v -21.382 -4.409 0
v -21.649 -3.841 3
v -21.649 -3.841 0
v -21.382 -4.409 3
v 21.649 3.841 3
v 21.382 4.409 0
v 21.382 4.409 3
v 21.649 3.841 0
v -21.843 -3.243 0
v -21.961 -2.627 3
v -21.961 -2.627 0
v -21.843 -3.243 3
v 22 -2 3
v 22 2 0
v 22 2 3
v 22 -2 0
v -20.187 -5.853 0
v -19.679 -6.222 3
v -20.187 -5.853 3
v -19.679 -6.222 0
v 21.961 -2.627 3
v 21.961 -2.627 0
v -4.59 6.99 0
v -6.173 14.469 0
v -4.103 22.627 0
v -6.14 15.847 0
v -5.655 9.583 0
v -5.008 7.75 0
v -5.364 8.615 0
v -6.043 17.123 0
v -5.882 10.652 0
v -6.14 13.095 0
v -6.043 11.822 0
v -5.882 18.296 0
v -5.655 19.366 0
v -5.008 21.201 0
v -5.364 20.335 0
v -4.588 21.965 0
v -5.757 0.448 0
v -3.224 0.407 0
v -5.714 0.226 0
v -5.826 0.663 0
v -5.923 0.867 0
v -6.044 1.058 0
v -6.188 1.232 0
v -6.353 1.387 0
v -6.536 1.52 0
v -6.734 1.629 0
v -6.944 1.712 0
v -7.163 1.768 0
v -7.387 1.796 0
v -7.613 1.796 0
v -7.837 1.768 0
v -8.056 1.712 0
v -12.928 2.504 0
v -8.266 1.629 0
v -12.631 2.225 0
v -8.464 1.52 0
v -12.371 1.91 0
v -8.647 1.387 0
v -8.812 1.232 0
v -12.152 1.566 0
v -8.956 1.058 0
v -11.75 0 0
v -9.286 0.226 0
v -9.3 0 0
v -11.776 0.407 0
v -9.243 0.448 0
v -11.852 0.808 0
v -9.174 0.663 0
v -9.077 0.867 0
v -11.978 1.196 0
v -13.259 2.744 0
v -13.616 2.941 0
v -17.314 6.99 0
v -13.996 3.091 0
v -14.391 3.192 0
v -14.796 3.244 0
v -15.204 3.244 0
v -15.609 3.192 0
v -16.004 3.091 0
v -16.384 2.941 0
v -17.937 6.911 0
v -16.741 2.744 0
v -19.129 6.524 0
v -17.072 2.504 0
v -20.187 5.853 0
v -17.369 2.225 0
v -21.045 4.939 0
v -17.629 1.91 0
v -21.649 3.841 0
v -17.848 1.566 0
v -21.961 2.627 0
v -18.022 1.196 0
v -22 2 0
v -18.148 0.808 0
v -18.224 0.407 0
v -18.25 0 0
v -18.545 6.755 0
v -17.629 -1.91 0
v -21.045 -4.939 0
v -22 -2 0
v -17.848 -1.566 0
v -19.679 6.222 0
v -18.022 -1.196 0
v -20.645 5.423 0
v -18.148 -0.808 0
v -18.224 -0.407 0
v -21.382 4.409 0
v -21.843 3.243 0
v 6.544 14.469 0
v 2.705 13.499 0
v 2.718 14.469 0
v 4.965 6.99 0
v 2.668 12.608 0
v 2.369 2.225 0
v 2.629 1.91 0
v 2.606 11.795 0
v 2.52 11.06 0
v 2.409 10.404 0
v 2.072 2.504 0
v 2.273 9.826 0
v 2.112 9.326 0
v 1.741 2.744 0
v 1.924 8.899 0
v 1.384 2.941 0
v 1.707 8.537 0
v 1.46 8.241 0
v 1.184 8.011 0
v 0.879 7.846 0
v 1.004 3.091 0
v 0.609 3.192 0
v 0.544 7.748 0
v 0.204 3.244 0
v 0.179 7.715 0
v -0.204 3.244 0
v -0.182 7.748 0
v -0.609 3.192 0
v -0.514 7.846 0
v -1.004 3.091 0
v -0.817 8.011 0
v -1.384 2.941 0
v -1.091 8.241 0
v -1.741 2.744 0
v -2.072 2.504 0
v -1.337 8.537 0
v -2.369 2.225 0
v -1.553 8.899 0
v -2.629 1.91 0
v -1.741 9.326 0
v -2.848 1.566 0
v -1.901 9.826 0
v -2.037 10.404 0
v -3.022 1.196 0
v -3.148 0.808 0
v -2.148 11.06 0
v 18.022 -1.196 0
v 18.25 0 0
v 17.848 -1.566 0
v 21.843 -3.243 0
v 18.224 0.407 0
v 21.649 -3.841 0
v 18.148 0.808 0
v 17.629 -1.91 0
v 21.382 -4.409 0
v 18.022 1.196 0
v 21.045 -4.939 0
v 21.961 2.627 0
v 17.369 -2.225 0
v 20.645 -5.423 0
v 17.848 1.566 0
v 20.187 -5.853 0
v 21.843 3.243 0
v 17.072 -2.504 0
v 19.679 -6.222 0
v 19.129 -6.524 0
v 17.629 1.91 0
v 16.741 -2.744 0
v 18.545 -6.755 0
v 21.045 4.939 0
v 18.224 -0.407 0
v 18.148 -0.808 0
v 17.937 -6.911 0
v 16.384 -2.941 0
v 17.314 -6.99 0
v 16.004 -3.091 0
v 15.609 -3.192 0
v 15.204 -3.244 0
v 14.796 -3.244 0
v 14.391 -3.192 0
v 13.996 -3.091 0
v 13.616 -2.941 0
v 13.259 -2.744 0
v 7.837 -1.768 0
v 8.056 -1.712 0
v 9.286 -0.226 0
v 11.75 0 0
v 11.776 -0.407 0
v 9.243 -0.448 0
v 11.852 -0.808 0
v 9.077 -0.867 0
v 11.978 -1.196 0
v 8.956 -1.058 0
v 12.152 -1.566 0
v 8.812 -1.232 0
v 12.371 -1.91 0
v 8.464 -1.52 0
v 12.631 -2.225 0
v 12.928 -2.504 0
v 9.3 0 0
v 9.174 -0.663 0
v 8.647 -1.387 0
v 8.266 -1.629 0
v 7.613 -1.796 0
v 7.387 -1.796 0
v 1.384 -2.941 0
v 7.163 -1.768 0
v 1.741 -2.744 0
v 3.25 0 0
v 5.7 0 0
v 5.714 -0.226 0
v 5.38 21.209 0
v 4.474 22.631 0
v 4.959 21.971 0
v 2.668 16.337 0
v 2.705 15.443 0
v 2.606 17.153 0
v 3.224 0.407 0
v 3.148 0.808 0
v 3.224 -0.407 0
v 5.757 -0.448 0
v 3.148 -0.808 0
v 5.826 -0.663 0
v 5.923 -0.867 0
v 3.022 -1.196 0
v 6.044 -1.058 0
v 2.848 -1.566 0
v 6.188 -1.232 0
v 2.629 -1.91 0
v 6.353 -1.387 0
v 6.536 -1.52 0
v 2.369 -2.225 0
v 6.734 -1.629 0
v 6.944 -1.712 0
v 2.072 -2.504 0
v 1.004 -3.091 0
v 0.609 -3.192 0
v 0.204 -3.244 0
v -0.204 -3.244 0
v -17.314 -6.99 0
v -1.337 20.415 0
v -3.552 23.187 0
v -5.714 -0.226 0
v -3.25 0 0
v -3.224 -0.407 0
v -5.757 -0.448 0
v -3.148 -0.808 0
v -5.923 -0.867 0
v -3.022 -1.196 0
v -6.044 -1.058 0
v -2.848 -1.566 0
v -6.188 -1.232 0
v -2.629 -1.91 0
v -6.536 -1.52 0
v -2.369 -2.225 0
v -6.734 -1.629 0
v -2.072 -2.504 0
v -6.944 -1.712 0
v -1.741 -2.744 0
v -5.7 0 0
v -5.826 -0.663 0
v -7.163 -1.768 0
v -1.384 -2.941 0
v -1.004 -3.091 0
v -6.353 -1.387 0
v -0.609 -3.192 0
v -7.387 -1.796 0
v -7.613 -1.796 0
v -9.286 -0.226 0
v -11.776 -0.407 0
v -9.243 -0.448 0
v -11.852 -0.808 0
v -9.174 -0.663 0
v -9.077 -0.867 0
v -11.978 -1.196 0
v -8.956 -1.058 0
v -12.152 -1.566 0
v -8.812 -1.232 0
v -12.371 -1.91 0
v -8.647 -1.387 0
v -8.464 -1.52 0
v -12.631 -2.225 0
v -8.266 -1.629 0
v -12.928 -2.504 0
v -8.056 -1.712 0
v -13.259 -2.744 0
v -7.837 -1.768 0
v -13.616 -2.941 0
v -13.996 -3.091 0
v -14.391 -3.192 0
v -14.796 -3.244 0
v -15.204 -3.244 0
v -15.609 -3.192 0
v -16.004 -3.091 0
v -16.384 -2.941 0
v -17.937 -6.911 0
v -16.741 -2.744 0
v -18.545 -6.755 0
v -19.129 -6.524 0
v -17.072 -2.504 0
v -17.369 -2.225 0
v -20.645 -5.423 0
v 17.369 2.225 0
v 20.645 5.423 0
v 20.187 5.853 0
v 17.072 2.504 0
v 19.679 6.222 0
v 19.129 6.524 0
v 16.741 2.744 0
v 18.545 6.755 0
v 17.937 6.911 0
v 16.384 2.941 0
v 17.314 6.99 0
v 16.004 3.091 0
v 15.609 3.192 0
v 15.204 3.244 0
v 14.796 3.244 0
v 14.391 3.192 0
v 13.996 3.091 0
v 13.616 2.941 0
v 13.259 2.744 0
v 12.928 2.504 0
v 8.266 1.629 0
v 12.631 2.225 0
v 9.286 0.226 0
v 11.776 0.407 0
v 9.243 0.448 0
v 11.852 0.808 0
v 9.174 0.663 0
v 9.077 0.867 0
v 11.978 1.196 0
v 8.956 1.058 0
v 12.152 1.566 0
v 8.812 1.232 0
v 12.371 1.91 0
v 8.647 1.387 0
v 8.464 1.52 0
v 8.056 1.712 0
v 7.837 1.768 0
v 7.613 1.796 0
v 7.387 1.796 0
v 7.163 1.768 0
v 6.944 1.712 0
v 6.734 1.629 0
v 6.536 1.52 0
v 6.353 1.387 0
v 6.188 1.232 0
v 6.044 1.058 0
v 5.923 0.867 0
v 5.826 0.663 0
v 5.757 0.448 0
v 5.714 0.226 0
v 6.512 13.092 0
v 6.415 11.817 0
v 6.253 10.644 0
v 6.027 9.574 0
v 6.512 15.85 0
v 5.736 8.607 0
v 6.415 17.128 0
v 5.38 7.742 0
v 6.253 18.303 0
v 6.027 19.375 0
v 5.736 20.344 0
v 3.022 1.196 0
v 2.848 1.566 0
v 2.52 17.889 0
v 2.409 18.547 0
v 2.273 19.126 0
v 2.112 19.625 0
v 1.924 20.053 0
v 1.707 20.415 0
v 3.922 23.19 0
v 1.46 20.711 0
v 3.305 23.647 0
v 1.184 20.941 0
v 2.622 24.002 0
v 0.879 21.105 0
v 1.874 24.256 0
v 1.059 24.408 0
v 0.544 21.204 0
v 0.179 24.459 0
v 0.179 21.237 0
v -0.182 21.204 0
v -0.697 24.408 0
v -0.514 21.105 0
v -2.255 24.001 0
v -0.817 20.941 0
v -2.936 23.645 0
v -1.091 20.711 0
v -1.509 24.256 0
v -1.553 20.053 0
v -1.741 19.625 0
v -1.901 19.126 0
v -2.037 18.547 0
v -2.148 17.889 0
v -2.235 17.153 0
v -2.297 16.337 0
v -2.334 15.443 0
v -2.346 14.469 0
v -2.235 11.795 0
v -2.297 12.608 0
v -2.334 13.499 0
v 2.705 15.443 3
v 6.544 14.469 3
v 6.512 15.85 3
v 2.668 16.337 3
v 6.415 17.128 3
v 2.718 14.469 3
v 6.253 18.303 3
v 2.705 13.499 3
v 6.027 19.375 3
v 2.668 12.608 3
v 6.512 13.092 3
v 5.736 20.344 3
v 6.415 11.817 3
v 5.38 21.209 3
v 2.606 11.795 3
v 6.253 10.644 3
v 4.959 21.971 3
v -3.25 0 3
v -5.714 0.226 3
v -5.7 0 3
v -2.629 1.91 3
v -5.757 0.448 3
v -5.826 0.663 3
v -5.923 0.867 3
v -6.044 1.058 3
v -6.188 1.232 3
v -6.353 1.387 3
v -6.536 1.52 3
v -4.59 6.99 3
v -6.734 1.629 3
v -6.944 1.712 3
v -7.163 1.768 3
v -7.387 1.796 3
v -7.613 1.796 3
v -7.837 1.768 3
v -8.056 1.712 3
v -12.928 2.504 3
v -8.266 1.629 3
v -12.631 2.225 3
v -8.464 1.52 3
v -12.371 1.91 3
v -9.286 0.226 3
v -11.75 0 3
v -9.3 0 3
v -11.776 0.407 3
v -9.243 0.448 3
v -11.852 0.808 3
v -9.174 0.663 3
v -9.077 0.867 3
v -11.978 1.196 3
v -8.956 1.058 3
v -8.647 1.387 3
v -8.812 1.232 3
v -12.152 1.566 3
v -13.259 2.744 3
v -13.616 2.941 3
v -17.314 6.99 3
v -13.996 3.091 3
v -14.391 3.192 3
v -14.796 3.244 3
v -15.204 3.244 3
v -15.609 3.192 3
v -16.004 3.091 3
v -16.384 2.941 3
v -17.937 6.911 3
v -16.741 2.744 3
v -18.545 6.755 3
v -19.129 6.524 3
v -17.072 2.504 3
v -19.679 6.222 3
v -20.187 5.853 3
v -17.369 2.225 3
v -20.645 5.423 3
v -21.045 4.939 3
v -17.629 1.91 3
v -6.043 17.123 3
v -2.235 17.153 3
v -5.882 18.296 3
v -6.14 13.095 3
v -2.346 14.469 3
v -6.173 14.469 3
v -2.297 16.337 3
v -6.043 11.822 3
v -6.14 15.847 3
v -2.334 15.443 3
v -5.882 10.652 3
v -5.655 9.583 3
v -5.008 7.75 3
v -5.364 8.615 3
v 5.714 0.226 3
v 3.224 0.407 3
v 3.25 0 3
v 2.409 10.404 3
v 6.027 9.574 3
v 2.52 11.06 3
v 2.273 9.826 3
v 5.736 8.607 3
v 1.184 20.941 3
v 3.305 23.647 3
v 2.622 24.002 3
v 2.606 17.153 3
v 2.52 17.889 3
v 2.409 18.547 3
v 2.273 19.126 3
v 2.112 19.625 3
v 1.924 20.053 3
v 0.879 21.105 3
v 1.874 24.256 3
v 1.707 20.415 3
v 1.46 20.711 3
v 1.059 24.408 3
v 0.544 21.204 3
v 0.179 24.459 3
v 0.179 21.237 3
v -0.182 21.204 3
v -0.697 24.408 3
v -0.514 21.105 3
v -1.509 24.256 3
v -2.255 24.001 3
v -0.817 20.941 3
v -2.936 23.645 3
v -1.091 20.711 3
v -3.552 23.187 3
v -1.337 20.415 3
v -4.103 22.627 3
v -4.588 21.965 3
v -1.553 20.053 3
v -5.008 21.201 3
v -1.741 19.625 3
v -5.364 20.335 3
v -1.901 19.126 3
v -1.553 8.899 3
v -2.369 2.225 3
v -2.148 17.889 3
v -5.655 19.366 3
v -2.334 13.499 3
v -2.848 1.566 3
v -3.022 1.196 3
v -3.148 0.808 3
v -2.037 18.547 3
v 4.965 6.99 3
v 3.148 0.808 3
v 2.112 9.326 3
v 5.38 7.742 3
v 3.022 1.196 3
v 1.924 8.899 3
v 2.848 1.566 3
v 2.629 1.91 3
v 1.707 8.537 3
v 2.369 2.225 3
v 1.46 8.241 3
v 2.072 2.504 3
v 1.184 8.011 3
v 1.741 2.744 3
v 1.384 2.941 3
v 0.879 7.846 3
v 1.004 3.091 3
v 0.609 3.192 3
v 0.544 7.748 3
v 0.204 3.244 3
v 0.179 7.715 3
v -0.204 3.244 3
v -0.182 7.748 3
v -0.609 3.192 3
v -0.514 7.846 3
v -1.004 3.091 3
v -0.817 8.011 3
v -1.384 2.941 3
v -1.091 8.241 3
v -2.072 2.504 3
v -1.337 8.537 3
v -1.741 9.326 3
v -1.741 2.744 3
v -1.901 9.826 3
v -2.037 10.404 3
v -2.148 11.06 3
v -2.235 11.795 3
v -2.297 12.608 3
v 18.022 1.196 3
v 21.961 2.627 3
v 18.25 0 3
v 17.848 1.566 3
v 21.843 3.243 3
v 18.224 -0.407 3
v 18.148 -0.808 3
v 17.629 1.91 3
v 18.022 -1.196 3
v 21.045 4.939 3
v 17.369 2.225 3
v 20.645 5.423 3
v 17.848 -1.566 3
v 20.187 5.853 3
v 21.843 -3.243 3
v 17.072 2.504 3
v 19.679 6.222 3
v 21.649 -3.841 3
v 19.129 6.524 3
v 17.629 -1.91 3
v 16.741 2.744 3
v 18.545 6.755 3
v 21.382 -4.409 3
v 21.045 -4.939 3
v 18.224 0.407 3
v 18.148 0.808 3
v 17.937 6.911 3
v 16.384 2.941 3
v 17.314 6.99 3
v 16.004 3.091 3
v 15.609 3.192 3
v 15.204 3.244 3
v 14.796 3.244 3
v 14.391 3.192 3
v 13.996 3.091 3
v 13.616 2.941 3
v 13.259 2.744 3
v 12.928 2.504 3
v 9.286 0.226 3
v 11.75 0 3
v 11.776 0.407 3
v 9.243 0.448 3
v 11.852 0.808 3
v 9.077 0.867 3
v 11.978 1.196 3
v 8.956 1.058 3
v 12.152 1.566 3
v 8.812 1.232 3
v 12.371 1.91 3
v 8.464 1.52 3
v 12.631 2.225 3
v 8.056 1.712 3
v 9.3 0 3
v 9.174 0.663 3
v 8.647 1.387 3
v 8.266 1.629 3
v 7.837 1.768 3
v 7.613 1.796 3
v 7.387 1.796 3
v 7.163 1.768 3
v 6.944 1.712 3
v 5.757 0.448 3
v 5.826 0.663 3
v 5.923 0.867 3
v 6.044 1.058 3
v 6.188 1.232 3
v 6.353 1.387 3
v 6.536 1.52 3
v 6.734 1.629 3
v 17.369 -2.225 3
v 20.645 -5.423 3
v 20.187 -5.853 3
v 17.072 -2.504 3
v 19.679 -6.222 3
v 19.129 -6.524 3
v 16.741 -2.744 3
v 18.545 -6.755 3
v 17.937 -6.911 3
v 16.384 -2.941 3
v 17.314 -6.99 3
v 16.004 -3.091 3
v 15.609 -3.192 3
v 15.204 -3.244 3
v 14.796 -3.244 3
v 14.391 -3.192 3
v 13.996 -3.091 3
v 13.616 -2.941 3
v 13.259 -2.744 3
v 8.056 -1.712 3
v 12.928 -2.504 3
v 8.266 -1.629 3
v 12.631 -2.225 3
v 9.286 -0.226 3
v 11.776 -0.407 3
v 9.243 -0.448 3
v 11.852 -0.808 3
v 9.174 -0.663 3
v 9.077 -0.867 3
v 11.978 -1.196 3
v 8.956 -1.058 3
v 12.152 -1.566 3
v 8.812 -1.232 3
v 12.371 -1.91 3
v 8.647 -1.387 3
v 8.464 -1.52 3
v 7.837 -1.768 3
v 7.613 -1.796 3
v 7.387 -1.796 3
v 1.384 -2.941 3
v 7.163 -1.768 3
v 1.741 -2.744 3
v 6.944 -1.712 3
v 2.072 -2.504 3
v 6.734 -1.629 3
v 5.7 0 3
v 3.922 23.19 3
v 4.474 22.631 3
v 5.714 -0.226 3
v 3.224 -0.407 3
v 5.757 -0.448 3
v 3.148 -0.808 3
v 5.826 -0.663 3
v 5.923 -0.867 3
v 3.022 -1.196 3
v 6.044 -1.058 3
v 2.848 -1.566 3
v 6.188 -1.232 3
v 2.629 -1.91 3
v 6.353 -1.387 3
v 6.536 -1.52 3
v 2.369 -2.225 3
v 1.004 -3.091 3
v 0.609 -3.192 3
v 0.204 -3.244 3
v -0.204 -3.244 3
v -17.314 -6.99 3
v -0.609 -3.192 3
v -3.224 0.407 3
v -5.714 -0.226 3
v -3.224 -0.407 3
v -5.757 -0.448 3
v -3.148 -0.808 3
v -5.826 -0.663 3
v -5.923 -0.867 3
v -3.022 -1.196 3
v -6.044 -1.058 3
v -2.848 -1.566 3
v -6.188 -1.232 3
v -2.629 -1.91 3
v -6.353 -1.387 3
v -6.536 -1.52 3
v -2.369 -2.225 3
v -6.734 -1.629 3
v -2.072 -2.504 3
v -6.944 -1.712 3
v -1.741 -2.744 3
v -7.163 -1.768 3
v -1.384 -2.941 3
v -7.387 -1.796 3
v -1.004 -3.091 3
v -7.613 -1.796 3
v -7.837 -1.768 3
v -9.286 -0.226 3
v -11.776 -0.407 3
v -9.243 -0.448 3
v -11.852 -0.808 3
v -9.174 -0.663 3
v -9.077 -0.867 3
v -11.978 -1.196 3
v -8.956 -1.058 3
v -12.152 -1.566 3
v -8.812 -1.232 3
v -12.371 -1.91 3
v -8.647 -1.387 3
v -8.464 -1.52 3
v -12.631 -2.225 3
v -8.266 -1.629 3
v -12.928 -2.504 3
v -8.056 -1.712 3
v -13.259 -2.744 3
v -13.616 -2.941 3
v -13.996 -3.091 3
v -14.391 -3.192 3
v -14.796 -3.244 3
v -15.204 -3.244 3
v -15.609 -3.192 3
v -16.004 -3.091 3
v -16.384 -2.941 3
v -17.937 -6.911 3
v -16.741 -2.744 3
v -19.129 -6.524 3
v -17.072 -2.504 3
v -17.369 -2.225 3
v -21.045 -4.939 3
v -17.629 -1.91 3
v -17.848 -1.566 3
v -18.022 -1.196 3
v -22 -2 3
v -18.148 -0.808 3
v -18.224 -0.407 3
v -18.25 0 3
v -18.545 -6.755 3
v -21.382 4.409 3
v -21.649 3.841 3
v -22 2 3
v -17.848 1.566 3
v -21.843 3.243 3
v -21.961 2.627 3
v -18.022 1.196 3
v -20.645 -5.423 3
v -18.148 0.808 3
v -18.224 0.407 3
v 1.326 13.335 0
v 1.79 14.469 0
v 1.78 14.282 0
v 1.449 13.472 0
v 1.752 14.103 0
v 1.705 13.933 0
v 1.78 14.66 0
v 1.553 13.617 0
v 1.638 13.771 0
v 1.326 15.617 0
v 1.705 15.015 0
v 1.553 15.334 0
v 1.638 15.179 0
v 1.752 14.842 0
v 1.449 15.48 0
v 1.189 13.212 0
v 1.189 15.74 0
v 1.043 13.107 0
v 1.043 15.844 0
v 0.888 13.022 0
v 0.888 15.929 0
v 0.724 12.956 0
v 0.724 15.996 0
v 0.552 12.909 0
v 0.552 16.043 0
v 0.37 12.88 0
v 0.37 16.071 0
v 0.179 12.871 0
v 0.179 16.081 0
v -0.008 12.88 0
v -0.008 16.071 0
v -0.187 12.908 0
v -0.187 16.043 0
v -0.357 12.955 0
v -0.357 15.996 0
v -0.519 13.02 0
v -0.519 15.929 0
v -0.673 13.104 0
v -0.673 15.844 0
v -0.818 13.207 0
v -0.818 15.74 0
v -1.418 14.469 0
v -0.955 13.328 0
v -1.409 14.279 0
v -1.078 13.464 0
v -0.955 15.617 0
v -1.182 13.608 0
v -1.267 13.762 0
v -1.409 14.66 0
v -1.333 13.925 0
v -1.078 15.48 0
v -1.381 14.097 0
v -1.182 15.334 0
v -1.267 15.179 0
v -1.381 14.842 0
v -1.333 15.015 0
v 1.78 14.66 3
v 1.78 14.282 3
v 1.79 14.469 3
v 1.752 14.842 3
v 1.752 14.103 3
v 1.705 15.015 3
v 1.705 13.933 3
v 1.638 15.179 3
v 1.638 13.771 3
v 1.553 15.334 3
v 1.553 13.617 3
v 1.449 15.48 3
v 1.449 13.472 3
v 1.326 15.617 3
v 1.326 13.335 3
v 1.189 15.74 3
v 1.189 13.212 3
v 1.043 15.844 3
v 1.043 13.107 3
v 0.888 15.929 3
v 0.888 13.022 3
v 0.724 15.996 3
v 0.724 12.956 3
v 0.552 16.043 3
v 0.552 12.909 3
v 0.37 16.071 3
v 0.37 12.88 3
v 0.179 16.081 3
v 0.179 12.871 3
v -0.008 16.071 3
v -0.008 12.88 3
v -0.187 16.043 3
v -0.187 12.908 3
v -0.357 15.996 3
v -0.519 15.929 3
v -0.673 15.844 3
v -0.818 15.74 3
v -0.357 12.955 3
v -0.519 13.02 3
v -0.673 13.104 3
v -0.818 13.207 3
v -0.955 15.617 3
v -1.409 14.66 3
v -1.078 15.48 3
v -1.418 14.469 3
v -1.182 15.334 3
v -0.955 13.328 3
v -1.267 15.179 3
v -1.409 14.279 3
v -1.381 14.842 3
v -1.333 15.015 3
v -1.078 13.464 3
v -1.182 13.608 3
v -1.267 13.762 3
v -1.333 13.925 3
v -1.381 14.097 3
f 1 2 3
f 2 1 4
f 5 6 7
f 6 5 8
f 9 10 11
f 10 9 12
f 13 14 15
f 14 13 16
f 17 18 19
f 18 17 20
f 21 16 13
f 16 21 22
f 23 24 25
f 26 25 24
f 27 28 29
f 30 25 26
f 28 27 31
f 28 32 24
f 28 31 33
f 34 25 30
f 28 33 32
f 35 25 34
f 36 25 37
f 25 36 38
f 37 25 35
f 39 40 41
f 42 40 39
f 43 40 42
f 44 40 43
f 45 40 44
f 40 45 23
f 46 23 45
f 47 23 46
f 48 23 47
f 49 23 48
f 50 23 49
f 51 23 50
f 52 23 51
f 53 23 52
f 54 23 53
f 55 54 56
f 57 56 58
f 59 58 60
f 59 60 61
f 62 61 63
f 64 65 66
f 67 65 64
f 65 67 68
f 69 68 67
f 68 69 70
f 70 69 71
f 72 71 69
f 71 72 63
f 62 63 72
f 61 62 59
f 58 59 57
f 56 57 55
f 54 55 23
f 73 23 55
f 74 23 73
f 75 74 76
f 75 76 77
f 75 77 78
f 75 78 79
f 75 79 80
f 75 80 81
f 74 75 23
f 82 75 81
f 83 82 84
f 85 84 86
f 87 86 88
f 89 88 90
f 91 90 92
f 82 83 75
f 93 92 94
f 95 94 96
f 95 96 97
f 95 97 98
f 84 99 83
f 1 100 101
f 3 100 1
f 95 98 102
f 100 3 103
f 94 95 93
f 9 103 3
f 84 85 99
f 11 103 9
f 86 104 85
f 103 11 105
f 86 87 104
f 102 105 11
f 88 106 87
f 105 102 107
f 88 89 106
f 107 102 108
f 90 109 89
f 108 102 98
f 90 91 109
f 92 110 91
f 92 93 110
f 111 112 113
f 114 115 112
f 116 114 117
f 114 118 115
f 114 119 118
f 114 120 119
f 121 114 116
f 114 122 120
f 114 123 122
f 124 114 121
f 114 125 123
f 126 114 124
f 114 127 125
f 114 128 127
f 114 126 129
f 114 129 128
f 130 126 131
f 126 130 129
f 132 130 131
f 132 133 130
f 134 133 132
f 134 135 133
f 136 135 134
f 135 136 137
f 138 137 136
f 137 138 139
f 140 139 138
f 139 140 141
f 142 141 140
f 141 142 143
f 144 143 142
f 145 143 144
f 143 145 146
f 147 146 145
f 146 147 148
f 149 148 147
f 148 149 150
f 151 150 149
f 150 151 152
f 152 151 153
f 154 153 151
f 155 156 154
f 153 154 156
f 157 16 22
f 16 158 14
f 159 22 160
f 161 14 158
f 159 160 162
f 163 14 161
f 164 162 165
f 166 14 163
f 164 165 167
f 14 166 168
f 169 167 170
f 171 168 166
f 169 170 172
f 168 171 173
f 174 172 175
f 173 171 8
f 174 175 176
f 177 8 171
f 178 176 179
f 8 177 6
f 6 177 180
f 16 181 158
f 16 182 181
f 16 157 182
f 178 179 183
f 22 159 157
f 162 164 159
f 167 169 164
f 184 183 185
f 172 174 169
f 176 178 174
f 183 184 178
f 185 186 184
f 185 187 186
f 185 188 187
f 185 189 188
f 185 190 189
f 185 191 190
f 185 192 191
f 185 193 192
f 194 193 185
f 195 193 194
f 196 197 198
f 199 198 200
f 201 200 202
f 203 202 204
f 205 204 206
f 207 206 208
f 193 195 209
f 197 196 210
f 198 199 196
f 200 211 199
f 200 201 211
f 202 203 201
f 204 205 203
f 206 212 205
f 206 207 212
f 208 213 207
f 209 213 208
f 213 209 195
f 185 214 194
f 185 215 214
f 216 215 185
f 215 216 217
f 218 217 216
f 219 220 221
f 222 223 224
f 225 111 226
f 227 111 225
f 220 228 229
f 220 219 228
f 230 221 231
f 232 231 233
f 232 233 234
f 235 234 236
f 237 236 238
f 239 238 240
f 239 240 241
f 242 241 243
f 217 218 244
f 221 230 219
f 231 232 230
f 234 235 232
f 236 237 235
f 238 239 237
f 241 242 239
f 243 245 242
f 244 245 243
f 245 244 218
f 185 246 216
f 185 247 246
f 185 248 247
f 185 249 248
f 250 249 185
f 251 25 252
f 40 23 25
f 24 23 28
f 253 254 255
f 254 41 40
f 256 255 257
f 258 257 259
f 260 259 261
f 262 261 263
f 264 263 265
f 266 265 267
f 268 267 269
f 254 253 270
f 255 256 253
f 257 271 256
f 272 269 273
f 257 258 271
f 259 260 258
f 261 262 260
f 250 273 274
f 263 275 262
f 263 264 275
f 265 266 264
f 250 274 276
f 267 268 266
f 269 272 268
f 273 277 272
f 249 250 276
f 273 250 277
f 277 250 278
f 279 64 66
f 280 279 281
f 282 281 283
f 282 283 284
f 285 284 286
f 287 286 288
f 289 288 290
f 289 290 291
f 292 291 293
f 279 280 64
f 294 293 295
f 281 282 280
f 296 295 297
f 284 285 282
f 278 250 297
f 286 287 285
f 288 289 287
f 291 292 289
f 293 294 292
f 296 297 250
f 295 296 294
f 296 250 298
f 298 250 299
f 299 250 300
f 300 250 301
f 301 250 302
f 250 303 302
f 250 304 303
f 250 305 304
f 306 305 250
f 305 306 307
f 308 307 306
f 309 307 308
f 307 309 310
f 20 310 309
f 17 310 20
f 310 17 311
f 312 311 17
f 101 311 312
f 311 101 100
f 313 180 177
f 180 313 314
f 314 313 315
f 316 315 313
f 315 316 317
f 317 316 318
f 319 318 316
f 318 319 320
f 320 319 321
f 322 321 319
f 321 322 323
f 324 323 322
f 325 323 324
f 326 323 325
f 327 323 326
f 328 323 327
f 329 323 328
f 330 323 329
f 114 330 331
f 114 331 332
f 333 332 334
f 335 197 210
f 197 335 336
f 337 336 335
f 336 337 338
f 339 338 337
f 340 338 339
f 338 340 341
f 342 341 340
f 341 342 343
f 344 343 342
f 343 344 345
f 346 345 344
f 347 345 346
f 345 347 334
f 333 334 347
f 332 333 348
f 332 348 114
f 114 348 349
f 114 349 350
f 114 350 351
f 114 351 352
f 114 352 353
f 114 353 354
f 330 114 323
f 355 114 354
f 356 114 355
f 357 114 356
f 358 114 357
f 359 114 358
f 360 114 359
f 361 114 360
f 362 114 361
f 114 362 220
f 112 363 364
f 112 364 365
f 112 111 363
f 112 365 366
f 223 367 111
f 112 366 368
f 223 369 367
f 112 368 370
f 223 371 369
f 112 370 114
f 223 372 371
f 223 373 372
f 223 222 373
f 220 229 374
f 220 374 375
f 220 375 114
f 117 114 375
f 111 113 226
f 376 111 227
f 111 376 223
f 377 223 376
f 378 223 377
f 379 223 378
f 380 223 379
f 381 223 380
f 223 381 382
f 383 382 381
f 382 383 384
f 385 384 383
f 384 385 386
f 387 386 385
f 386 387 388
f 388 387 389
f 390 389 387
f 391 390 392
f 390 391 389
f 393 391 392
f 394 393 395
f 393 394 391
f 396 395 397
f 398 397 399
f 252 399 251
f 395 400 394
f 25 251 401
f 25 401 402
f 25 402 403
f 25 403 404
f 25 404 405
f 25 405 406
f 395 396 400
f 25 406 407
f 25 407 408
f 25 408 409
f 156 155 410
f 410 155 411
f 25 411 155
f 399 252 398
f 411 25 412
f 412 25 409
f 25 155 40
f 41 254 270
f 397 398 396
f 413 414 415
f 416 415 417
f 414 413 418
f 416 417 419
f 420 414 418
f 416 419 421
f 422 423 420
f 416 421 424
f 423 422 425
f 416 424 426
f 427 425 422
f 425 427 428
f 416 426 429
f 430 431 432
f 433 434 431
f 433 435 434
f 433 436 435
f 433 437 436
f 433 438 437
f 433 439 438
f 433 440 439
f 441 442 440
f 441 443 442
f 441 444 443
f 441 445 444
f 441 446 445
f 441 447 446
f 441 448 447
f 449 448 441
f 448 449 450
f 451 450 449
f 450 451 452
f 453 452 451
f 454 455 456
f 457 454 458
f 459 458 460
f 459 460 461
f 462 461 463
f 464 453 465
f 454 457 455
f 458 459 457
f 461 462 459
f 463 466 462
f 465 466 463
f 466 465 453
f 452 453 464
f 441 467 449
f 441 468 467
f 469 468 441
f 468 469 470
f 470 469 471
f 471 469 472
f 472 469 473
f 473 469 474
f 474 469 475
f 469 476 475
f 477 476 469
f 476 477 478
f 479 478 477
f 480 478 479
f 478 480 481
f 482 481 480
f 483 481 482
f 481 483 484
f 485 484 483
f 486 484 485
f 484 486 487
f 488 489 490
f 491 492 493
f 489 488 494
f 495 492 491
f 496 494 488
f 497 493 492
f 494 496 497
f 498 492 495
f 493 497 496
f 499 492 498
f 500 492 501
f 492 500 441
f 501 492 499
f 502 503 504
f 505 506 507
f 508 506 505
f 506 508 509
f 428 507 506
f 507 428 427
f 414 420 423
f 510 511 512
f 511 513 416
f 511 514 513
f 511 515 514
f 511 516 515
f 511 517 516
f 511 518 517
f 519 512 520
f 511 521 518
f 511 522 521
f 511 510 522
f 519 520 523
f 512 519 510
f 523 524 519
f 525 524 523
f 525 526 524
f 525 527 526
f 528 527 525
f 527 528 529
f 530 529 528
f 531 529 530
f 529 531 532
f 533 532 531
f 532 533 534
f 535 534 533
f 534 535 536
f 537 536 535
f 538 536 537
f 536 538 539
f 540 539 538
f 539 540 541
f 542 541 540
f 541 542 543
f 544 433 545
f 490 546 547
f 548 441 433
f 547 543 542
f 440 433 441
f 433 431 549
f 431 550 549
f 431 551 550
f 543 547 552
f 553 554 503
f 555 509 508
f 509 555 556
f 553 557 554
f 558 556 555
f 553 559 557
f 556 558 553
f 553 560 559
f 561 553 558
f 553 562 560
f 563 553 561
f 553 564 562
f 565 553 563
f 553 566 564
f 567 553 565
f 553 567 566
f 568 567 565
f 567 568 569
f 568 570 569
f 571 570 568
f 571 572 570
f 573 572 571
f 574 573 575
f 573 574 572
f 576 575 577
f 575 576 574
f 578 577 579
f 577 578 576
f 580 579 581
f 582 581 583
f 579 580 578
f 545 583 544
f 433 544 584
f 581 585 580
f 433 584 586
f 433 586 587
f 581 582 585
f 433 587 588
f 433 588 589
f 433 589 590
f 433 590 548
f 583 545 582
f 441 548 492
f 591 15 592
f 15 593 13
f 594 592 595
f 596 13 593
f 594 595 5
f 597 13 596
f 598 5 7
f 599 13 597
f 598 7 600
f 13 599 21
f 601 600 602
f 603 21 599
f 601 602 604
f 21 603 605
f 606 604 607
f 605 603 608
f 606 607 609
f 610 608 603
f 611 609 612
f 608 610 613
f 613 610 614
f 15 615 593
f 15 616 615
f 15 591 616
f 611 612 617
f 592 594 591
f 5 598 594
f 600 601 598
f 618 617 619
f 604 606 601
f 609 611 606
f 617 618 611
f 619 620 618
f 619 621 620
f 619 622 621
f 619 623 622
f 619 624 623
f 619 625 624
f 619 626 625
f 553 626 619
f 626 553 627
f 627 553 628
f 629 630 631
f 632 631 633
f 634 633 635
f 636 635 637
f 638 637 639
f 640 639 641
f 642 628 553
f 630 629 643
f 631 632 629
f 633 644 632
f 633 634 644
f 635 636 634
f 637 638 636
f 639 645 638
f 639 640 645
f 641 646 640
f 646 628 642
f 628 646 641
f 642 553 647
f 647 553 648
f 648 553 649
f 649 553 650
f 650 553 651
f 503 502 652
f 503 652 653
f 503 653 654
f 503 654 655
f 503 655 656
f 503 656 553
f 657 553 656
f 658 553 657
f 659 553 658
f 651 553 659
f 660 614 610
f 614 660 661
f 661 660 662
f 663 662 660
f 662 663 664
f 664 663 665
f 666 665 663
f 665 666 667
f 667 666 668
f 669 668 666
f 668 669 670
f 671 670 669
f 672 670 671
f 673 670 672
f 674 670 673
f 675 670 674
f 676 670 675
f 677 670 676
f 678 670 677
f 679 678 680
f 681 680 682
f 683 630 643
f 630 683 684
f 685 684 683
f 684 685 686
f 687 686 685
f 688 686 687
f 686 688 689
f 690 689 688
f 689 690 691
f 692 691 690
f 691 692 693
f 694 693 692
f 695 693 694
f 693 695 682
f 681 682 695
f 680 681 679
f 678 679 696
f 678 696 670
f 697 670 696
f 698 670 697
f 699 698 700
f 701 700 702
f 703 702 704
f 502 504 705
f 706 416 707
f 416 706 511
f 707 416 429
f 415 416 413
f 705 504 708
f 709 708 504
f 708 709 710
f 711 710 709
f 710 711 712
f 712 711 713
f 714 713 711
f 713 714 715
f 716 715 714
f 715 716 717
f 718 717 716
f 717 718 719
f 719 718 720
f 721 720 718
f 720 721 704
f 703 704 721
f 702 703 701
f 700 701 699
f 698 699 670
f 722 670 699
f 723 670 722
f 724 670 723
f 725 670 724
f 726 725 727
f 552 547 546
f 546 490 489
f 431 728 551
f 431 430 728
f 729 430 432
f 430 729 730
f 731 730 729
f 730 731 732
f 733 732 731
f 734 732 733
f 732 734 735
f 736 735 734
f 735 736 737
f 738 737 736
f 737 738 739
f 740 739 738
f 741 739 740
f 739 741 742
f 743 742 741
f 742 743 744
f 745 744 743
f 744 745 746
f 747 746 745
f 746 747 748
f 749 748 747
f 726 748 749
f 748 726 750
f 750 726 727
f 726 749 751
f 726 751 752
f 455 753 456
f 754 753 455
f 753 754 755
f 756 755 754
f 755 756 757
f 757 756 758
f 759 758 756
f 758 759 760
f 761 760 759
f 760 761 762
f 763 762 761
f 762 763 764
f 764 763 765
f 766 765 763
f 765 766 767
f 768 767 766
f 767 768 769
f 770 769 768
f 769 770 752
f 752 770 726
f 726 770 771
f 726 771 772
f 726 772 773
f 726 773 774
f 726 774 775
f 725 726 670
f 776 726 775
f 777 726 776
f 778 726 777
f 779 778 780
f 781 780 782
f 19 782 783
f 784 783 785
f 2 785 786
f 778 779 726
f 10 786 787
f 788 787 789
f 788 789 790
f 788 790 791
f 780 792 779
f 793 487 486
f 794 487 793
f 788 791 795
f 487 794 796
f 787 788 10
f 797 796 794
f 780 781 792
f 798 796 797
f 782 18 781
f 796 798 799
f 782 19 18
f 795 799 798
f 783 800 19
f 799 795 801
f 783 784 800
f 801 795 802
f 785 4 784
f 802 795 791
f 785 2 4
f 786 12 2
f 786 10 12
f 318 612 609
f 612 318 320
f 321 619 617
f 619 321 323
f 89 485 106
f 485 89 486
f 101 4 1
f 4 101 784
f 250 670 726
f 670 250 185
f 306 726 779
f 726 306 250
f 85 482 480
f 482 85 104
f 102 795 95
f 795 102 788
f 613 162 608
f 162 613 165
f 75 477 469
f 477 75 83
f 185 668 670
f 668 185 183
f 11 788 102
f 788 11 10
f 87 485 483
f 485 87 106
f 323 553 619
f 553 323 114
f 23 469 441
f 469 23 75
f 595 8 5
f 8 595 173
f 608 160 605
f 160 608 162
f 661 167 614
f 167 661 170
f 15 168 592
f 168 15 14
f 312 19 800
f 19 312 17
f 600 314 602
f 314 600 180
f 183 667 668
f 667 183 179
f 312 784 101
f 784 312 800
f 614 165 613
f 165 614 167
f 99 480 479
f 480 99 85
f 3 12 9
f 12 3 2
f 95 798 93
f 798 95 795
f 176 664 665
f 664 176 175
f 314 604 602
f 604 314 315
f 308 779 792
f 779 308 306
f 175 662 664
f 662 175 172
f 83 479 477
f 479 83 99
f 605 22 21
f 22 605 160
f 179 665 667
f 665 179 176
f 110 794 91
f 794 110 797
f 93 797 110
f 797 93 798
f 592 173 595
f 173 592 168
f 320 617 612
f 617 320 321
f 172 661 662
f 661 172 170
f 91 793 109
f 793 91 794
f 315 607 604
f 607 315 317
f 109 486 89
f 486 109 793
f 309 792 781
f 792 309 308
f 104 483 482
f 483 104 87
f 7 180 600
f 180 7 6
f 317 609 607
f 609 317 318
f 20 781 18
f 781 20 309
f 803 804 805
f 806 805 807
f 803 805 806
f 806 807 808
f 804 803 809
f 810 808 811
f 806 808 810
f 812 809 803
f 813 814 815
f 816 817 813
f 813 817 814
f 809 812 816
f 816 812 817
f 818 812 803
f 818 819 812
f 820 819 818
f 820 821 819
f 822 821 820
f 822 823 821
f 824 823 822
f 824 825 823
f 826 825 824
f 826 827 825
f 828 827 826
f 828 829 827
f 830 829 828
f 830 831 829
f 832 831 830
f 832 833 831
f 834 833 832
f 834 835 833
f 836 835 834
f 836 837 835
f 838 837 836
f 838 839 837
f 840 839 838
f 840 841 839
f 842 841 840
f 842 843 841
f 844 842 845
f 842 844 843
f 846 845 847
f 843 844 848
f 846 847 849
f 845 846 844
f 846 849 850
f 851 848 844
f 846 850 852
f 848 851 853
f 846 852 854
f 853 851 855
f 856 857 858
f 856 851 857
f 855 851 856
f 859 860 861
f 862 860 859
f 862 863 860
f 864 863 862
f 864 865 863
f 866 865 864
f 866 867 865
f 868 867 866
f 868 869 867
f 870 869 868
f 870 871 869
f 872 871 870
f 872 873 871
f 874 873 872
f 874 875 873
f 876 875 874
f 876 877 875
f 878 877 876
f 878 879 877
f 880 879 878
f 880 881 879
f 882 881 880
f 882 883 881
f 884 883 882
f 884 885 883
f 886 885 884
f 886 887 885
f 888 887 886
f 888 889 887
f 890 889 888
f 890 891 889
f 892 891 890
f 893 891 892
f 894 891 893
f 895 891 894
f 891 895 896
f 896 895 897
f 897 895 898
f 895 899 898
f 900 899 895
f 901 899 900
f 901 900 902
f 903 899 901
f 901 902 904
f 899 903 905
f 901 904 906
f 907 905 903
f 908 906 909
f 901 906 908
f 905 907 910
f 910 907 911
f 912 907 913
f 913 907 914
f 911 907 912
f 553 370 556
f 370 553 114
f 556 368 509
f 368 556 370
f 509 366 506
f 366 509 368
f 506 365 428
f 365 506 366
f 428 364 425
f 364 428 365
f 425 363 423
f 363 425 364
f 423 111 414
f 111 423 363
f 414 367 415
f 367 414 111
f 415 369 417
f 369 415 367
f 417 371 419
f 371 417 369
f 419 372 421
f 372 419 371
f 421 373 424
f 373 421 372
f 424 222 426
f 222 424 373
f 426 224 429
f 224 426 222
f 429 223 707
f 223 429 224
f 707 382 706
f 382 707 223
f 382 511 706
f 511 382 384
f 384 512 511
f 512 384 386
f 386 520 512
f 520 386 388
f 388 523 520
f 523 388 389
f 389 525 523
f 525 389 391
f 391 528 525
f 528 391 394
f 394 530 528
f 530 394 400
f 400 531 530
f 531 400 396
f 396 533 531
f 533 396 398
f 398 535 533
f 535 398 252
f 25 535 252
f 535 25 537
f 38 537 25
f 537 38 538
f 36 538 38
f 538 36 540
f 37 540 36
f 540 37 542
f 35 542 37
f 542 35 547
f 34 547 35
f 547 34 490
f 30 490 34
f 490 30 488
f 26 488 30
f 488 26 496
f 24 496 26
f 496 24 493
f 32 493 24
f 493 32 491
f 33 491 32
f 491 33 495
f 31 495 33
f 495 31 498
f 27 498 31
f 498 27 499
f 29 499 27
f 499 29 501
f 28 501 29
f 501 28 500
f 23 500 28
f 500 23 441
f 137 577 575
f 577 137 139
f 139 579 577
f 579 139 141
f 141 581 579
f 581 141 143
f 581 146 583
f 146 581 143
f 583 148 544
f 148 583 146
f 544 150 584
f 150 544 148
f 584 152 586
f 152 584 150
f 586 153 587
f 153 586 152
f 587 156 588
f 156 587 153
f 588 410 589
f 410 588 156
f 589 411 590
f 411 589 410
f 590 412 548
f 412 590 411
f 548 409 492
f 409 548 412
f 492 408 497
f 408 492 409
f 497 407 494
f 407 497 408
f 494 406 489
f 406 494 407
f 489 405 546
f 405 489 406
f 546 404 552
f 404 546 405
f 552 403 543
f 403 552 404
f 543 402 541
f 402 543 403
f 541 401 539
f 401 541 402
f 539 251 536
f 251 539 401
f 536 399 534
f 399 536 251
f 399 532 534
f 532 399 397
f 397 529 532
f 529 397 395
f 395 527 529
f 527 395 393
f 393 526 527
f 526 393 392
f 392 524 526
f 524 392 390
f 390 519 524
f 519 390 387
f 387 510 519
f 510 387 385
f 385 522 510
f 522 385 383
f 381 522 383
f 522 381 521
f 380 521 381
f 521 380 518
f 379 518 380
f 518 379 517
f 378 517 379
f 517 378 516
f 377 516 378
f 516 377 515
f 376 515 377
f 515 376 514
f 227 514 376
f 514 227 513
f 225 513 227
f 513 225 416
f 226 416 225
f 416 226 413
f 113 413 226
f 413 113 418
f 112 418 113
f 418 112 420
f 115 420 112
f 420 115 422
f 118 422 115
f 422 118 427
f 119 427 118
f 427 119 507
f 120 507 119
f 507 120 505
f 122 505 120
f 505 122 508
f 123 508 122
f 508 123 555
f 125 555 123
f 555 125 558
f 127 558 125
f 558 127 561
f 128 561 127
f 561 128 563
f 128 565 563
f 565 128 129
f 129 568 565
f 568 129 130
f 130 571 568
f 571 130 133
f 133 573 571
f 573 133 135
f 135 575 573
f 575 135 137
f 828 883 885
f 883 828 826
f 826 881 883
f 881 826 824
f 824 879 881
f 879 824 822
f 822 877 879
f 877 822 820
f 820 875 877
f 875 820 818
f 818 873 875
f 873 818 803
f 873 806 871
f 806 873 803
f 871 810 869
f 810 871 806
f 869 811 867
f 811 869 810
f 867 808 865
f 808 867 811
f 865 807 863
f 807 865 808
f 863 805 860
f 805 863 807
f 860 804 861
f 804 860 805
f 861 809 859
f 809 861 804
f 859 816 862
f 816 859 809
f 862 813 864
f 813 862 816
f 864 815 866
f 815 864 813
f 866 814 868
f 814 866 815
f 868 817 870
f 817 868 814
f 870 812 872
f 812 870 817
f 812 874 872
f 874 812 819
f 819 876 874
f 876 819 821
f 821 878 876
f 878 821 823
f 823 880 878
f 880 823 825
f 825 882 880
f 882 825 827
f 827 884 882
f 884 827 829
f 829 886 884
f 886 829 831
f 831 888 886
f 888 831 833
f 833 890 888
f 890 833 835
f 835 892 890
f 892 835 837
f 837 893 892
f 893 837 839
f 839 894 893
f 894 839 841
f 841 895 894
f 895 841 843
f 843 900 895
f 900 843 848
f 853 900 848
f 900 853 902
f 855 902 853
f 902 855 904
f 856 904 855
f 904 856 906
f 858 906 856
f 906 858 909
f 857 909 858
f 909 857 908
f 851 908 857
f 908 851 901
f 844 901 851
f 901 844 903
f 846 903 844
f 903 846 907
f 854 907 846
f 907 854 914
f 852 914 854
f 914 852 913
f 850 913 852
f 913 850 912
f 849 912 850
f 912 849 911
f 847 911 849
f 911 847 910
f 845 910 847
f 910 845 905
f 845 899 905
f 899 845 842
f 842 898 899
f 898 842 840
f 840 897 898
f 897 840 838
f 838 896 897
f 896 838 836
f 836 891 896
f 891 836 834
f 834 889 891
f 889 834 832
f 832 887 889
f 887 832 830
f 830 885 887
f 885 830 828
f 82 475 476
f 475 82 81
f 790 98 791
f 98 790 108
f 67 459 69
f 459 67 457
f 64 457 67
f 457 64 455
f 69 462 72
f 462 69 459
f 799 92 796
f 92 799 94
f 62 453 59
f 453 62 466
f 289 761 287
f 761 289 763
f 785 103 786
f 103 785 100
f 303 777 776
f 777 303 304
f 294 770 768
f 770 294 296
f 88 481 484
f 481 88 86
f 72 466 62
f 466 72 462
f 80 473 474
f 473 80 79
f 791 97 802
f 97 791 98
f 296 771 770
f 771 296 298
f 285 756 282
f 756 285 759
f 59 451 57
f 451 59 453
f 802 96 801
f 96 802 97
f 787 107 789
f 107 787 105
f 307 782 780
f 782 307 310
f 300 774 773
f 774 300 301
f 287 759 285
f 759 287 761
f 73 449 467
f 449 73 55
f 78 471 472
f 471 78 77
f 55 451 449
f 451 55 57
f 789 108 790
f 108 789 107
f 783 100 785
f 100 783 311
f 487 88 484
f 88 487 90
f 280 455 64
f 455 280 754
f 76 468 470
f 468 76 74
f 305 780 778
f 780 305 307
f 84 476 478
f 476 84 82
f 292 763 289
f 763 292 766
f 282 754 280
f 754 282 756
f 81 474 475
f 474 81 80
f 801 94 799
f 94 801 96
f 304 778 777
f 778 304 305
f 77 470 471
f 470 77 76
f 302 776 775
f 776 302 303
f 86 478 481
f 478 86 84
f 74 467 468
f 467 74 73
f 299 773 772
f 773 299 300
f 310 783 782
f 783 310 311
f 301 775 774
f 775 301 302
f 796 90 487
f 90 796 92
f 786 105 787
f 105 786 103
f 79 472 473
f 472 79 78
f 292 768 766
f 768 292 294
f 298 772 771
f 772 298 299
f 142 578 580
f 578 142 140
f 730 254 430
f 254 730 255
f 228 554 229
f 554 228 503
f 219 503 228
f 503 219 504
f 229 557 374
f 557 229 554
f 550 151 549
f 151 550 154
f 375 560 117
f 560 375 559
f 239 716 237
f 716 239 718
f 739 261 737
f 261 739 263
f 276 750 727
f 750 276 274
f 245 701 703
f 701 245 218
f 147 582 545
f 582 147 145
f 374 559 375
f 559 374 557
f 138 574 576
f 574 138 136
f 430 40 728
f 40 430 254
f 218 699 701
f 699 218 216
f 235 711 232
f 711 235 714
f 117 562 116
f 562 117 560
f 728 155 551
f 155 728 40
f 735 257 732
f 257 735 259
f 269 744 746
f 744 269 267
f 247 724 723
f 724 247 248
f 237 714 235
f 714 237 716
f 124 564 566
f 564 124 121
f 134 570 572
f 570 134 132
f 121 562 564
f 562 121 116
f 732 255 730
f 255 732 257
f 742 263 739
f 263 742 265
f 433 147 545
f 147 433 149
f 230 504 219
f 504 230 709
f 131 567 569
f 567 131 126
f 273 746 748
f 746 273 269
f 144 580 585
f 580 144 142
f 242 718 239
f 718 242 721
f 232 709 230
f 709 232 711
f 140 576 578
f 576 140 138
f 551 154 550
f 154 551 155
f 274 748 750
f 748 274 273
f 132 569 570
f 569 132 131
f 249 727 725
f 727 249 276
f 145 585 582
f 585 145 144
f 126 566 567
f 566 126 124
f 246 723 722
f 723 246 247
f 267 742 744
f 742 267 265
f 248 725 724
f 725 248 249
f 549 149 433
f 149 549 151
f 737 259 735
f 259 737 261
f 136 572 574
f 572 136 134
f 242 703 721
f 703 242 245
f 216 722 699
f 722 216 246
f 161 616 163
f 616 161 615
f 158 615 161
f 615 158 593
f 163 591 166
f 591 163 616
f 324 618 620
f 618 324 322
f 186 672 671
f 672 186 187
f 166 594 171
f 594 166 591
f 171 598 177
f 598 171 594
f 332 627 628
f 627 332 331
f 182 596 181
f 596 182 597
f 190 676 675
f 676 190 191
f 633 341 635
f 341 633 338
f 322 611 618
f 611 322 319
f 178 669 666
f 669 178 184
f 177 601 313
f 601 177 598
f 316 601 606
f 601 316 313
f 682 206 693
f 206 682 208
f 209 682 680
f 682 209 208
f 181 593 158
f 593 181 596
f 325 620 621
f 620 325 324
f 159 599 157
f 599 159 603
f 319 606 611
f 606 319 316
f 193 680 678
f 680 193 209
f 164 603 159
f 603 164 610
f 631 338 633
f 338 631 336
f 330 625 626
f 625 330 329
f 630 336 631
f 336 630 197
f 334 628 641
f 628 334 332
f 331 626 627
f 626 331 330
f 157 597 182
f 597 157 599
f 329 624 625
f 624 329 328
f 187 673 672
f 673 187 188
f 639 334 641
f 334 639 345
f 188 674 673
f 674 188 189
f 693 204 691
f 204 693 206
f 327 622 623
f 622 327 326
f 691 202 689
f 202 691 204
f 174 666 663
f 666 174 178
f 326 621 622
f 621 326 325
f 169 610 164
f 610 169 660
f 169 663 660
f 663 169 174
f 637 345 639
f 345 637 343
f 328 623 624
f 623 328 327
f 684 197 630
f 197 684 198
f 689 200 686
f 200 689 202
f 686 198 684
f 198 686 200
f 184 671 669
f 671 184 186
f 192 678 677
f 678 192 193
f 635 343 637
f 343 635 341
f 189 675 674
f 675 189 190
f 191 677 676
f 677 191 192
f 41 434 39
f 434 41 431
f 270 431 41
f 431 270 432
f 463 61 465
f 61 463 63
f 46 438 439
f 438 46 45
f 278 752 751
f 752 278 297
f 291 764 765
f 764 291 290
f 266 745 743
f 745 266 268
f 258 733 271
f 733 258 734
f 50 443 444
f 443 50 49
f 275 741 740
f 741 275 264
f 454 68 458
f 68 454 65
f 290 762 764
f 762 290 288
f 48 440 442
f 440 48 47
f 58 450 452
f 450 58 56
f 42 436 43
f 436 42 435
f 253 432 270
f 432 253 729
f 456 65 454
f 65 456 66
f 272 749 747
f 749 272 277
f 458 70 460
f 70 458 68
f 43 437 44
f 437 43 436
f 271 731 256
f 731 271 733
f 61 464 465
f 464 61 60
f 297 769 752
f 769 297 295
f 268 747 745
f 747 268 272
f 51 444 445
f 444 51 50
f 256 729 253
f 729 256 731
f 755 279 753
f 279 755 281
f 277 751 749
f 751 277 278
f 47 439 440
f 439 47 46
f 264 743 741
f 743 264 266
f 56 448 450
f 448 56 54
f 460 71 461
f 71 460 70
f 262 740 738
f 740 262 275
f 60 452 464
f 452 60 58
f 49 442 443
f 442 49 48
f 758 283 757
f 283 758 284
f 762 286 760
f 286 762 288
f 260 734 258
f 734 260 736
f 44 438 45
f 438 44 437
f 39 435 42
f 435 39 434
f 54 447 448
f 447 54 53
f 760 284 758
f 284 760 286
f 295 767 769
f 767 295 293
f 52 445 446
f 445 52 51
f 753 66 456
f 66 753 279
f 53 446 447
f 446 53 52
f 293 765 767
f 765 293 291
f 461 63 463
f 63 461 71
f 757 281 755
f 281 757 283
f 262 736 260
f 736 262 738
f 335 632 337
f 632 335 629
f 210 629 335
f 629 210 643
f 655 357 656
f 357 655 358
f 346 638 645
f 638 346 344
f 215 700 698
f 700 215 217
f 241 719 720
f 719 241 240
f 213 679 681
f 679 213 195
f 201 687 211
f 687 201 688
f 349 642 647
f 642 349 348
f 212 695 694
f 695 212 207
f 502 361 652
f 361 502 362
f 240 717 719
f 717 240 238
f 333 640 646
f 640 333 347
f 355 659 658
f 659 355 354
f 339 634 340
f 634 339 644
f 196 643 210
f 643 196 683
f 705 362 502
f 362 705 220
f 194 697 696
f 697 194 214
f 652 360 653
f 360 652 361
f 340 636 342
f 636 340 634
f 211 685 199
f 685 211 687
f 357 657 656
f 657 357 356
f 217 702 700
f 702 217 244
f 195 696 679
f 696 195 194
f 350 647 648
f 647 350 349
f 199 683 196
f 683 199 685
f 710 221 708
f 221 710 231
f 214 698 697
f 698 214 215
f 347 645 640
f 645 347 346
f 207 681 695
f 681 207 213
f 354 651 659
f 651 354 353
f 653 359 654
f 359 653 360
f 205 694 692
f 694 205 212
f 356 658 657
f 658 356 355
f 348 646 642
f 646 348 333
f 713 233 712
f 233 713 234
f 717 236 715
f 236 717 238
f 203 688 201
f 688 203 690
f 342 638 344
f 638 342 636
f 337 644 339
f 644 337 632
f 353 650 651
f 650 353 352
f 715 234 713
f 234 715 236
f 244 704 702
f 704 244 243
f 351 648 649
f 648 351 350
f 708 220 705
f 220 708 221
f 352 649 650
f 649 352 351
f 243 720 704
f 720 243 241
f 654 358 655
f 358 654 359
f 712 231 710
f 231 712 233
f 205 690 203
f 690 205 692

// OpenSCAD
$fn = 50;


difference() {
	union() {
		hull() {
			translate(v = [-17.0000000000, 2.0000000000, 0]) {
				cylinder(h = 3, r = 5);
			}
			translate(v = [17.0000000000, 2.0000000000, 0]) {
				cylinder(h = 3, r = 5);
			}
			translate(v = [-17.0000000000, -2.0000000000, 0]) {
				cylinder(h = 3, r = 5);
			}
			translate(v = [17.0000000000, -2.0000000000, 0]) {
				cylinder(h = 3, r = 5);
			}
		}
		translate(v = [0, 24, 0]) {
			linear_extrude(height = 3) {
				text(font = "DejaVu Sans Mono:style=Bold", halign = "center", size = 19.0000000000, text = "0", valign = "top");
			}
		}
	}
	union() {
		translate(v = [-15.0000000000, 0.0000000000, 0]) {
			translate(v = [0, 0, -100]) {
				cylinder(h = 200, r = 3.2500000000);
			}
		}
		translate(v = [0, 0, -100]) {
			cylinder(h = 200, r = 3.2500000000);
		}
		translate(v = [15.0000000000, 0.0000000000, 0]) {
			translate(v = [0, 0, -100]) {
				cylinder(h = 200, r = 3.2500000000);
			}
		}
		translate(v = [-15.0000000000, 0.0000000000, 0]) {
			translate(v = [0, 0, -100]) {
				cylinder(h = 200, r = 1.8000000000);
			}
		}
		translate(v = [-7.5000000000, 0.0000000000, 0]) {
			translate(v = [0, 0, -100]) {
				cylinder(h = 200, r = 1.8000000000);
			}
		}
		translate(v = [0, 0, -100]) {
			cylinder(h = 200, r = 1.8000000000);
		}
		translate(v = [7.5000000000, 0.0000000000, 0]) {
			translate(v = [0, 0, -100]) {
				cylinder(h = 200, r = 1.8000000000);
			}
		}
		translate(v = [15.0000000000, 0.0000000000, 0]) {
			translate(v = [0, 0, -100]) {
				cylinder(h = 200, r = 1.8000000000);
			}
		}
	}
}
